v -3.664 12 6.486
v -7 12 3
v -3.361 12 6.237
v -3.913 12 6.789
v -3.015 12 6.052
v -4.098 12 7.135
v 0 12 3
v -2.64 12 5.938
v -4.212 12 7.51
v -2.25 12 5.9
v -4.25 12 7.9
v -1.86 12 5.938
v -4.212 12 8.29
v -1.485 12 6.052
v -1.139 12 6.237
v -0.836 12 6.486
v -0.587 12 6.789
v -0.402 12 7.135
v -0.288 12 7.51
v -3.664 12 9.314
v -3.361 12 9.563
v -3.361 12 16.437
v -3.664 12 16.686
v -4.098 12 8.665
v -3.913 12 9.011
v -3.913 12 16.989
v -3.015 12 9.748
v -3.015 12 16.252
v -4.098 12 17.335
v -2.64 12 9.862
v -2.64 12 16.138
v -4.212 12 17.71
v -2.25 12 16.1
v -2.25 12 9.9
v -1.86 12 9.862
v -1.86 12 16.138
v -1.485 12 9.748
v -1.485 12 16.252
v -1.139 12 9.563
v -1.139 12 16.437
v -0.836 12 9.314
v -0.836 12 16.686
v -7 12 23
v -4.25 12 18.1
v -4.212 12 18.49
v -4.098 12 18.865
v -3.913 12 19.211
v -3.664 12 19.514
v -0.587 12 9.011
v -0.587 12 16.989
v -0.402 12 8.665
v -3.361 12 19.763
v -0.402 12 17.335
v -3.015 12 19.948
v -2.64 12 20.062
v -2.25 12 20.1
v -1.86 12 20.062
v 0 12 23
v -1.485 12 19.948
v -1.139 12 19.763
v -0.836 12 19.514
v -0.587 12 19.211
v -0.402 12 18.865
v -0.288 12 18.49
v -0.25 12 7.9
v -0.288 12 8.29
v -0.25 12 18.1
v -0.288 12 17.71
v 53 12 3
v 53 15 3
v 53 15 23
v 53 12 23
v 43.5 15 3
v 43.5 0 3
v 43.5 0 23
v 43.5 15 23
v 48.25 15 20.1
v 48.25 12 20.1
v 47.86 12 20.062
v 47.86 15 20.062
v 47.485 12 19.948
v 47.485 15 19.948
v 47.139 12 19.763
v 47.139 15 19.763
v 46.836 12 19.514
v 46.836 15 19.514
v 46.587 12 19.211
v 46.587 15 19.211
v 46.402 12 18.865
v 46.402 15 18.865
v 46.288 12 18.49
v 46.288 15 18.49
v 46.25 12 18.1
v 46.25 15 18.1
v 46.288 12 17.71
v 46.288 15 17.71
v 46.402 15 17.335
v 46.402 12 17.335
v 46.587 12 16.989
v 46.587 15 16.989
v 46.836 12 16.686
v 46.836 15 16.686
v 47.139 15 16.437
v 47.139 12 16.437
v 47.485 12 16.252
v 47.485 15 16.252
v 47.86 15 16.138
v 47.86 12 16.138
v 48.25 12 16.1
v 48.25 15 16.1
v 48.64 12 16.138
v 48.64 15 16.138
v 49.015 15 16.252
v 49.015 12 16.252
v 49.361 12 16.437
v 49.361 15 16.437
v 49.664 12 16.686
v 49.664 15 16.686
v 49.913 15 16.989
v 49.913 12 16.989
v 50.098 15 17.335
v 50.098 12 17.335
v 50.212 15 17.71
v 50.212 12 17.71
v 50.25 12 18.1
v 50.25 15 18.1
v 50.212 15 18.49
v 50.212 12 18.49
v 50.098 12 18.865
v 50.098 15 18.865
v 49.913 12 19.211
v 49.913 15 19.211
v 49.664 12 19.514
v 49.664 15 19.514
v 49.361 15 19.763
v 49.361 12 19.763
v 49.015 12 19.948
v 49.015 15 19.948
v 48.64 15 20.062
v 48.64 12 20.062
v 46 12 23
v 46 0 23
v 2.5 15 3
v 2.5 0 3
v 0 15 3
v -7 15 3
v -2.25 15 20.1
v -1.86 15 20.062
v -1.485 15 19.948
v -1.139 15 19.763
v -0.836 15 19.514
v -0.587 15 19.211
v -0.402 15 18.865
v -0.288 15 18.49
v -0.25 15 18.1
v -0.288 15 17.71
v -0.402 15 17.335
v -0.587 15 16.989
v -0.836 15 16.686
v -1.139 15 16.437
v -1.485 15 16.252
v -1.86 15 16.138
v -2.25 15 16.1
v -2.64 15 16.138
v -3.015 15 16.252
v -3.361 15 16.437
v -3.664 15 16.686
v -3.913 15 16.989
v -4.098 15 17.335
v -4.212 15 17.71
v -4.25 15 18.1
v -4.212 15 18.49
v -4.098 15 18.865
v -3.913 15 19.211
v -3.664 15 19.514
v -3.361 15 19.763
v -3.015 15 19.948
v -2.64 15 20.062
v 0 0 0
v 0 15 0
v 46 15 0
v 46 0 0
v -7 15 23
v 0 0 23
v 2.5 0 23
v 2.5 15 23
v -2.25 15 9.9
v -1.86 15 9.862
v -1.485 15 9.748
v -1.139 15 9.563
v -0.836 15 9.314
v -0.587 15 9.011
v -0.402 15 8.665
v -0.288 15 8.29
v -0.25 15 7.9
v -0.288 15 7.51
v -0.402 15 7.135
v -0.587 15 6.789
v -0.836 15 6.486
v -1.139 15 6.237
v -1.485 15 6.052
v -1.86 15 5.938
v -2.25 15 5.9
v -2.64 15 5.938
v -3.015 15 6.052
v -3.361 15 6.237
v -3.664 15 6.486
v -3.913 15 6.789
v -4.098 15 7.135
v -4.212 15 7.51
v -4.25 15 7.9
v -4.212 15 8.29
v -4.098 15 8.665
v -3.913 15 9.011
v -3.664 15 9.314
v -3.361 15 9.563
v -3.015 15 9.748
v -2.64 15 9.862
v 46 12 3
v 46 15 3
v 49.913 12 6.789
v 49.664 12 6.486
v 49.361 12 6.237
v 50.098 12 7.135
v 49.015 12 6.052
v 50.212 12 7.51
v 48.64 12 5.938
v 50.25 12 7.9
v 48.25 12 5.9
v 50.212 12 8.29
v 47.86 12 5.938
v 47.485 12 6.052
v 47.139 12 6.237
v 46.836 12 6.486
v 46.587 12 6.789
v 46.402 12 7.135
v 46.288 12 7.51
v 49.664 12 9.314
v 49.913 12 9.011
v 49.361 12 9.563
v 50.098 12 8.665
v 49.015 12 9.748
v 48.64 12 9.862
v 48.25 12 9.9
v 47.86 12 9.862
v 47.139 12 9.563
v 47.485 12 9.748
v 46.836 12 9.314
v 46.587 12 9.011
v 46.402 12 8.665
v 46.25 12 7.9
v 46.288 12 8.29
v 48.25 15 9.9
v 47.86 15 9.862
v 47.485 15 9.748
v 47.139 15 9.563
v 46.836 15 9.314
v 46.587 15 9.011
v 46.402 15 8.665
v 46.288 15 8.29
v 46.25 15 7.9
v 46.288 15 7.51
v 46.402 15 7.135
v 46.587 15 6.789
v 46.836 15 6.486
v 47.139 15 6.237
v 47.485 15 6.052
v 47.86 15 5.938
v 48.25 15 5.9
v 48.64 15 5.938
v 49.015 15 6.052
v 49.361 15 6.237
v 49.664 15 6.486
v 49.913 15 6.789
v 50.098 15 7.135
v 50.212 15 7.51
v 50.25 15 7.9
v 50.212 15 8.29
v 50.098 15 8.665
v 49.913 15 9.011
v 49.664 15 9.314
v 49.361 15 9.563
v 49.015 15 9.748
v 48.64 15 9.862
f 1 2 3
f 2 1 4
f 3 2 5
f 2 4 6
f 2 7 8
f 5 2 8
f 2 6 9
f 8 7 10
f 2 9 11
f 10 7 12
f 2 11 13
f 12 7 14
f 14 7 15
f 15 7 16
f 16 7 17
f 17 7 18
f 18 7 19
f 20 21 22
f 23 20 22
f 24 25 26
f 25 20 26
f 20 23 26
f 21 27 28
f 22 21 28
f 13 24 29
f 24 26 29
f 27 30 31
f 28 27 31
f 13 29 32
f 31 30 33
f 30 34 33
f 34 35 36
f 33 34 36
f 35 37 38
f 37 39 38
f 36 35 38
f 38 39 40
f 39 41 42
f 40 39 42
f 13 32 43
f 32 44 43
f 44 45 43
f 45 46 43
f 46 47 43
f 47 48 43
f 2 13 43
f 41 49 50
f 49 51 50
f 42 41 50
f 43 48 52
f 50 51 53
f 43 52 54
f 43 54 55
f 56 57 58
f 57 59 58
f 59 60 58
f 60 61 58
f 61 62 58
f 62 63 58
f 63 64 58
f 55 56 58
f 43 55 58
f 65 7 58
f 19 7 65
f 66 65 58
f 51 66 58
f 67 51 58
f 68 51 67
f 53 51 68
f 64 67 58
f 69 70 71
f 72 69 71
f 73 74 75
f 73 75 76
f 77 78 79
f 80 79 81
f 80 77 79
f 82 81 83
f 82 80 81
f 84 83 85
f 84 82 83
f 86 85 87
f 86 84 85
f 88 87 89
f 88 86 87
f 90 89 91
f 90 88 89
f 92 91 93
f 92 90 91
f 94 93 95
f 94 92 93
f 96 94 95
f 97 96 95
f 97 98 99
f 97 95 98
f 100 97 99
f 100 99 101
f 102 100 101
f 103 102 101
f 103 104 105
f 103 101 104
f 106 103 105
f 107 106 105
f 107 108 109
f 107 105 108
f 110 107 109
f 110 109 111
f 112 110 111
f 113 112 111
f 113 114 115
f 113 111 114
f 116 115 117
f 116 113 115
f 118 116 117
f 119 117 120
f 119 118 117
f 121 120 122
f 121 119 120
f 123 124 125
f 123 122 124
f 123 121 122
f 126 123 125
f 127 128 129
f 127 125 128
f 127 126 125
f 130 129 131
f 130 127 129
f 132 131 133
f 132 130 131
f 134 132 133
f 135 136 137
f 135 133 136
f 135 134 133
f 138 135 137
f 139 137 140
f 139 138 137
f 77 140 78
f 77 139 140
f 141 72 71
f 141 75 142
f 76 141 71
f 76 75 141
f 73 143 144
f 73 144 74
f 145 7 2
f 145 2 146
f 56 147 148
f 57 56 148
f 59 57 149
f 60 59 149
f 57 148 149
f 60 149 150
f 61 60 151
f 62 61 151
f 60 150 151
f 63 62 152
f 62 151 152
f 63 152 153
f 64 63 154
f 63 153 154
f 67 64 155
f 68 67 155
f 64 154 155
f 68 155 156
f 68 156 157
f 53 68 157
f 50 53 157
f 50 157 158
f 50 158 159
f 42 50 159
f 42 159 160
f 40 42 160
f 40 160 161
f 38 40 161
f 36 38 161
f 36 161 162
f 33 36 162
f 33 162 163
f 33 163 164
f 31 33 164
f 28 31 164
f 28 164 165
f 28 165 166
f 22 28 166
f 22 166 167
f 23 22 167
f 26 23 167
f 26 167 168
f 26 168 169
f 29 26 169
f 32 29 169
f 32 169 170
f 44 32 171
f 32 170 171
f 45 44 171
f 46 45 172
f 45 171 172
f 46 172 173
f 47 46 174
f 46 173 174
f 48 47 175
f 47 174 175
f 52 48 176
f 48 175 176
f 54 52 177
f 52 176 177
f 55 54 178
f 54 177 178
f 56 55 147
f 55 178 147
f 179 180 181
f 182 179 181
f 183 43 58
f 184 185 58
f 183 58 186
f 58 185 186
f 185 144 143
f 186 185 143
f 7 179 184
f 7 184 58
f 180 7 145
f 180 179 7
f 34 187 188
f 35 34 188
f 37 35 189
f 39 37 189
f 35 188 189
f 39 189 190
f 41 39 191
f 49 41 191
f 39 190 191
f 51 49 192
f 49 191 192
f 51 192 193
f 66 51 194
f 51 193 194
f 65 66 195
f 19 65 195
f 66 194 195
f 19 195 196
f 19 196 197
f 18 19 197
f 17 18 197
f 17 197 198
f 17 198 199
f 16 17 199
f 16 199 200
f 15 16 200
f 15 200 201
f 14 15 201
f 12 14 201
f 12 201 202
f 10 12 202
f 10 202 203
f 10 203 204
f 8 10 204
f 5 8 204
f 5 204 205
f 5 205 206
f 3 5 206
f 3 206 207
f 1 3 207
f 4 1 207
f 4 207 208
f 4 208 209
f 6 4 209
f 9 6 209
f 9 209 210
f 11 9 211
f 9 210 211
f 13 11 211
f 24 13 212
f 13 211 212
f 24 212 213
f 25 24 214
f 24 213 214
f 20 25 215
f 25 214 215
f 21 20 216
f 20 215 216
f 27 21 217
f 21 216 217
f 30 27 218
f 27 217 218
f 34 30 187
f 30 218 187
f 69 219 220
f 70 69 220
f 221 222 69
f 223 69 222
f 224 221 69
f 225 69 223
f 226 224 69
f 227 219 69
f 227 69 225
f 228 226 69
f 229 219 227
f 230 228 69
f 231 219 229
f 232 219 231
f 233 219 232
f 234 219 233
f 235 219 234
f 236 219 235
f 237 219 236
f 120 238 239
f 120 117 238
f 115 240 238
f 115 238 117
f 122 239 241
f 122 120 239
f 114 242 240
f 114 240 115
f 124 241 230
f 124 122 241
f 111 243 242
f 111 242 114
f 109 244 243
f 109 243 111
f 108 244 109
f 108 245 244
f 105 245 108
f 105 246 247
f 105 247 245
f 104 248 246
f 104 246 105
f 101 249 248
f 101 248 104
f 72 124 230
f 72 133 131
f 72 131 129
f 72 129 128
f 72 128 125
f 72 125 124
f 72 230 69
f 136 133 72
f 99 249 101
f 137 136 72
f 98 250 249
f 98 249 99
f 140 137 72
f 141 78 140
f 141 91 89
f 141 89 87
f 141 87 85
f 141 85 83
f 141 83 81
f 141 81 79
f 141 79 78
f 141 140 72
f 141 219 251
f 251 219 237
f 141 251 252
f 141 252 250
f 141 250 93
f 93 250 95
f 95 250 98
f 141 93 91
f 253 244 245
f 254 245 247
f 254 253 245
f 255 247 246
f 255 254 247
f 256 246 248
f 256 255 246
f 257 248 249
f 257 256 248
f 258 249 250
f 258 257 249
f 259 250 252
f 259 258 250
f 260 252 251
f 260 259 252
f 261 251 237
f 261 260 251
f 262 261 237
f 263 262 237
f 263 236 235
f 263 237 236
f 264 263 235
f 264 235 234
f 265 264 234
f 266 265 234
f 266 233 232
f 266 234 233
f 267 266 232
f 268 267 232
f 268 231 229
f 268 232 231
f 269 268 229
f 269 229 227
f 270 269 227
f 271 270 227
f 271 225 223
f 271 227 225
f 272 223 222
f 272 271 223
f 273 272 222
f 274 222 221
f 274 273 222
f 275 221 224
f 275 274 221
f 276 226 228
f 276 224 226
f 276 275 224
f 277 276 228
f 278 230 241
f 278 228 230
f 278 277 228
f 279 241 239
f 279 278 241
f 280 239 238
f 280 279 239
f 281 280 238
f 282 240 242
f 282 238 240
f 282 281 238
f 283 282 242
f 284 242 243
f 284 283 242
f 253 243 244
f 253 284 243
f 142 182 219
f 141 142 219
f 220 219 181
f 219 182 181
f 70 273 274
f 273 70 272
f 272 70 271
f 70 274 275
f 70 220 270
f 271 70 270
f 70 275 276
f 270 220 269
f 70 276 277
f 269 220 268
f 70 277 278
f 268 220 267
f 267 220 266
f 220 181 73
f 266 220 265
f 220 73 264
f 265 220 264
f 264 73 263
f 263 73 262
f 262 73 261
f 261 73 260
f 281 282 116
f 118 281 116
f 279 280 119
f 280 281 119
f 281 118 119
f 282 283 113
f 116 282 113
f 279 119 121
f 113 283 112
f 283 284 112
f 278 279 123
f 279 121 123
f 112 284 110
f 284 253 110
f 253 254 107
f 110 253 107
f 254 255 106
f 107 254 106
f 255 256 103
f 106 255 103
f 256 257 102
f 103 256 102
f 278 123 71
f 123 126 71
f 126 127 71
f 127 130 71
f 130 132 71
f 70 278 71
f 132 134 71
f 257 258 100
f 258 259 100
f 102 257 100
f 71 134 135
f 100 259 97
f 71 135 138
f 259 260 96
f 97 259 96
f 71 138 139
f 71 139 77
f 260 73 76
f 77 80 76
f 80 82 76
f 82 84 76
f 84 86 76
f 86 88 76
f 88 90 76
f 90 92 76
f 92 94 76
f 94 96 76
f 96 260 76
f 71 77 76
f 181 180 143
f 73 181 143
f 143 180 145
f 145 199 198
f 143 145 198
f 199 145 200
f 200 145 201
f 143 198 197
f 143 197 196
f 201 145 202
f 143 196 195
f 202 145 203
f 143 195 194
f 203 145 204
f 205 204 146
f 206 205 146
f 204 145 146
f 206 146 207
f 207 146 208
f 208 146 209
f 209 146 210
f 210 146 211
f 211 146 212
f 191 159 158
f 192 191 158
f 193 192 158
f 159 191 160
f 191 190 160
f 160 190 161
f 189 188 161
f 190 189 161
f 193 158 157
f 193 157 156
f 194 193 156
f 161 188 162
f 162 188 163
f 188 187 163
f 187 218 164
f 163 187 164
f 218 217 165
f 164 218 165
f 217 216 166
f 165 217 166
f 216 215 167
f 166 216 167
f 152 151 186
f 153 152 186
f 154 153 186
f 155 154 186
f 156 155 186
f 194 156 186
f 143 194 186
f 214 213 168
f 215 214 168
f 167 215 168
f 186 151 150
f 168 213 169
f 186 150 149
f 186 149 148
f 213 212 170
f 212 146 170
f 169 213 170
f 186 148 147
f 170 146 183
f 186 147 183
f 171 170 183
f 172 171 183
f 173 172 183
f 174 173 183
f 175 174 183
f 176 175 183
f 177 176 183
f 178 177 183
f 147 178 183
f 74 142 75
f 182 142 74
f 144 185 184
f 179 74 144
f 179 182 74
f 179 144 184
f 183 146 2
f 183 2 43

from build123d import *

# Parameters (mm, degrees)
SKETCH1_W           = 46
SKETCH1_H           = 15
BOSS_EXTRUDE1_DEPTH = 3
SKETCH3_W           = 2.5
SKETCH3_H           = 15
BOSS_EXTRUDE2_DEPTH = 20
SKETCH4_W           = 20
SKETCH4_H           = 3
BOSS_EXTRUDE3_DEPTH = 7
SKETCH5_R           = 2
CUT_EXTRUDE1_DEPTH  = 7


with BuildPart() as part:
    # Sketch1 → Boss-Extrude1 (new body)
    with BuildSketch(Plane.XY):
        with Locations((23, 7.5)):
            Rectangle(SKETCH1_W, SKETCH1_H)
    extrude(amount=BOSS_EXTRUDE1_DEPTH)

    # Sketch3 → Boss-Extrude2 (add)
    with BuildSketch(Plane.XY.offset(3)):
        with Locations((1.25, 7.5)):
            Rectangle(SKETCH3_W, SKETCH3_H)
    boss_extrude2 = extrude(amount=BOSS_EXTRUDE2_DEPTH)

    # Sketch4 → Boss-Extrude3 (add)
    with BuildSketch(Plane.ZY):
        with Locations((13, 13.5)):
            Rectangle(SKETCH4_W, SKETCH4_H)
    boss_extrude3 = extrude(amount=BOSS_EXTRUDE3_DEPTH)

    # Sketch5 → Cut-Extrude1 (cut)
    with BuildSketch(Plane(origin=(0, 15, 0), x_dir=(1, 0, 0), z_dir=(0, 1, 0))):
        with Locations(Location((-2.25, -18.1, 0), (0, 0, 270))):
            Circle(SKETCH5_R)
        with Locations(Location((-2.25, -7.9, 0), (0, 0, 270))):
            Circle(SKETCH5_R)
    cut_extrude1 = extrude(amount=-CUT_EXTRUDE1_DEPTH, mode=Mode.SUBTRACT)

    # Mirror1: Boss-Extrude2, Boss-Extrude3, Cut-Extrude1 across plane
    add(boss_extrude2.mirror(Plane(origin=(23, 0, 0), x_dir=(0, 0, 1), z_dir=(1, 0, 0))))
    add(boss_extrude3.mirror(Plane(origin=(23, 0, 0), x_dir=(0, 0, 1), z_dir=(1, 0, 0))))
    add(cut_extrude1.mirror(Plane(origin=(23, 0, 0), x_dir=(0, 0, 1), z_dir=(1, 0, 0))), mode=Mode.SUBTRACT)


solid = part.part
